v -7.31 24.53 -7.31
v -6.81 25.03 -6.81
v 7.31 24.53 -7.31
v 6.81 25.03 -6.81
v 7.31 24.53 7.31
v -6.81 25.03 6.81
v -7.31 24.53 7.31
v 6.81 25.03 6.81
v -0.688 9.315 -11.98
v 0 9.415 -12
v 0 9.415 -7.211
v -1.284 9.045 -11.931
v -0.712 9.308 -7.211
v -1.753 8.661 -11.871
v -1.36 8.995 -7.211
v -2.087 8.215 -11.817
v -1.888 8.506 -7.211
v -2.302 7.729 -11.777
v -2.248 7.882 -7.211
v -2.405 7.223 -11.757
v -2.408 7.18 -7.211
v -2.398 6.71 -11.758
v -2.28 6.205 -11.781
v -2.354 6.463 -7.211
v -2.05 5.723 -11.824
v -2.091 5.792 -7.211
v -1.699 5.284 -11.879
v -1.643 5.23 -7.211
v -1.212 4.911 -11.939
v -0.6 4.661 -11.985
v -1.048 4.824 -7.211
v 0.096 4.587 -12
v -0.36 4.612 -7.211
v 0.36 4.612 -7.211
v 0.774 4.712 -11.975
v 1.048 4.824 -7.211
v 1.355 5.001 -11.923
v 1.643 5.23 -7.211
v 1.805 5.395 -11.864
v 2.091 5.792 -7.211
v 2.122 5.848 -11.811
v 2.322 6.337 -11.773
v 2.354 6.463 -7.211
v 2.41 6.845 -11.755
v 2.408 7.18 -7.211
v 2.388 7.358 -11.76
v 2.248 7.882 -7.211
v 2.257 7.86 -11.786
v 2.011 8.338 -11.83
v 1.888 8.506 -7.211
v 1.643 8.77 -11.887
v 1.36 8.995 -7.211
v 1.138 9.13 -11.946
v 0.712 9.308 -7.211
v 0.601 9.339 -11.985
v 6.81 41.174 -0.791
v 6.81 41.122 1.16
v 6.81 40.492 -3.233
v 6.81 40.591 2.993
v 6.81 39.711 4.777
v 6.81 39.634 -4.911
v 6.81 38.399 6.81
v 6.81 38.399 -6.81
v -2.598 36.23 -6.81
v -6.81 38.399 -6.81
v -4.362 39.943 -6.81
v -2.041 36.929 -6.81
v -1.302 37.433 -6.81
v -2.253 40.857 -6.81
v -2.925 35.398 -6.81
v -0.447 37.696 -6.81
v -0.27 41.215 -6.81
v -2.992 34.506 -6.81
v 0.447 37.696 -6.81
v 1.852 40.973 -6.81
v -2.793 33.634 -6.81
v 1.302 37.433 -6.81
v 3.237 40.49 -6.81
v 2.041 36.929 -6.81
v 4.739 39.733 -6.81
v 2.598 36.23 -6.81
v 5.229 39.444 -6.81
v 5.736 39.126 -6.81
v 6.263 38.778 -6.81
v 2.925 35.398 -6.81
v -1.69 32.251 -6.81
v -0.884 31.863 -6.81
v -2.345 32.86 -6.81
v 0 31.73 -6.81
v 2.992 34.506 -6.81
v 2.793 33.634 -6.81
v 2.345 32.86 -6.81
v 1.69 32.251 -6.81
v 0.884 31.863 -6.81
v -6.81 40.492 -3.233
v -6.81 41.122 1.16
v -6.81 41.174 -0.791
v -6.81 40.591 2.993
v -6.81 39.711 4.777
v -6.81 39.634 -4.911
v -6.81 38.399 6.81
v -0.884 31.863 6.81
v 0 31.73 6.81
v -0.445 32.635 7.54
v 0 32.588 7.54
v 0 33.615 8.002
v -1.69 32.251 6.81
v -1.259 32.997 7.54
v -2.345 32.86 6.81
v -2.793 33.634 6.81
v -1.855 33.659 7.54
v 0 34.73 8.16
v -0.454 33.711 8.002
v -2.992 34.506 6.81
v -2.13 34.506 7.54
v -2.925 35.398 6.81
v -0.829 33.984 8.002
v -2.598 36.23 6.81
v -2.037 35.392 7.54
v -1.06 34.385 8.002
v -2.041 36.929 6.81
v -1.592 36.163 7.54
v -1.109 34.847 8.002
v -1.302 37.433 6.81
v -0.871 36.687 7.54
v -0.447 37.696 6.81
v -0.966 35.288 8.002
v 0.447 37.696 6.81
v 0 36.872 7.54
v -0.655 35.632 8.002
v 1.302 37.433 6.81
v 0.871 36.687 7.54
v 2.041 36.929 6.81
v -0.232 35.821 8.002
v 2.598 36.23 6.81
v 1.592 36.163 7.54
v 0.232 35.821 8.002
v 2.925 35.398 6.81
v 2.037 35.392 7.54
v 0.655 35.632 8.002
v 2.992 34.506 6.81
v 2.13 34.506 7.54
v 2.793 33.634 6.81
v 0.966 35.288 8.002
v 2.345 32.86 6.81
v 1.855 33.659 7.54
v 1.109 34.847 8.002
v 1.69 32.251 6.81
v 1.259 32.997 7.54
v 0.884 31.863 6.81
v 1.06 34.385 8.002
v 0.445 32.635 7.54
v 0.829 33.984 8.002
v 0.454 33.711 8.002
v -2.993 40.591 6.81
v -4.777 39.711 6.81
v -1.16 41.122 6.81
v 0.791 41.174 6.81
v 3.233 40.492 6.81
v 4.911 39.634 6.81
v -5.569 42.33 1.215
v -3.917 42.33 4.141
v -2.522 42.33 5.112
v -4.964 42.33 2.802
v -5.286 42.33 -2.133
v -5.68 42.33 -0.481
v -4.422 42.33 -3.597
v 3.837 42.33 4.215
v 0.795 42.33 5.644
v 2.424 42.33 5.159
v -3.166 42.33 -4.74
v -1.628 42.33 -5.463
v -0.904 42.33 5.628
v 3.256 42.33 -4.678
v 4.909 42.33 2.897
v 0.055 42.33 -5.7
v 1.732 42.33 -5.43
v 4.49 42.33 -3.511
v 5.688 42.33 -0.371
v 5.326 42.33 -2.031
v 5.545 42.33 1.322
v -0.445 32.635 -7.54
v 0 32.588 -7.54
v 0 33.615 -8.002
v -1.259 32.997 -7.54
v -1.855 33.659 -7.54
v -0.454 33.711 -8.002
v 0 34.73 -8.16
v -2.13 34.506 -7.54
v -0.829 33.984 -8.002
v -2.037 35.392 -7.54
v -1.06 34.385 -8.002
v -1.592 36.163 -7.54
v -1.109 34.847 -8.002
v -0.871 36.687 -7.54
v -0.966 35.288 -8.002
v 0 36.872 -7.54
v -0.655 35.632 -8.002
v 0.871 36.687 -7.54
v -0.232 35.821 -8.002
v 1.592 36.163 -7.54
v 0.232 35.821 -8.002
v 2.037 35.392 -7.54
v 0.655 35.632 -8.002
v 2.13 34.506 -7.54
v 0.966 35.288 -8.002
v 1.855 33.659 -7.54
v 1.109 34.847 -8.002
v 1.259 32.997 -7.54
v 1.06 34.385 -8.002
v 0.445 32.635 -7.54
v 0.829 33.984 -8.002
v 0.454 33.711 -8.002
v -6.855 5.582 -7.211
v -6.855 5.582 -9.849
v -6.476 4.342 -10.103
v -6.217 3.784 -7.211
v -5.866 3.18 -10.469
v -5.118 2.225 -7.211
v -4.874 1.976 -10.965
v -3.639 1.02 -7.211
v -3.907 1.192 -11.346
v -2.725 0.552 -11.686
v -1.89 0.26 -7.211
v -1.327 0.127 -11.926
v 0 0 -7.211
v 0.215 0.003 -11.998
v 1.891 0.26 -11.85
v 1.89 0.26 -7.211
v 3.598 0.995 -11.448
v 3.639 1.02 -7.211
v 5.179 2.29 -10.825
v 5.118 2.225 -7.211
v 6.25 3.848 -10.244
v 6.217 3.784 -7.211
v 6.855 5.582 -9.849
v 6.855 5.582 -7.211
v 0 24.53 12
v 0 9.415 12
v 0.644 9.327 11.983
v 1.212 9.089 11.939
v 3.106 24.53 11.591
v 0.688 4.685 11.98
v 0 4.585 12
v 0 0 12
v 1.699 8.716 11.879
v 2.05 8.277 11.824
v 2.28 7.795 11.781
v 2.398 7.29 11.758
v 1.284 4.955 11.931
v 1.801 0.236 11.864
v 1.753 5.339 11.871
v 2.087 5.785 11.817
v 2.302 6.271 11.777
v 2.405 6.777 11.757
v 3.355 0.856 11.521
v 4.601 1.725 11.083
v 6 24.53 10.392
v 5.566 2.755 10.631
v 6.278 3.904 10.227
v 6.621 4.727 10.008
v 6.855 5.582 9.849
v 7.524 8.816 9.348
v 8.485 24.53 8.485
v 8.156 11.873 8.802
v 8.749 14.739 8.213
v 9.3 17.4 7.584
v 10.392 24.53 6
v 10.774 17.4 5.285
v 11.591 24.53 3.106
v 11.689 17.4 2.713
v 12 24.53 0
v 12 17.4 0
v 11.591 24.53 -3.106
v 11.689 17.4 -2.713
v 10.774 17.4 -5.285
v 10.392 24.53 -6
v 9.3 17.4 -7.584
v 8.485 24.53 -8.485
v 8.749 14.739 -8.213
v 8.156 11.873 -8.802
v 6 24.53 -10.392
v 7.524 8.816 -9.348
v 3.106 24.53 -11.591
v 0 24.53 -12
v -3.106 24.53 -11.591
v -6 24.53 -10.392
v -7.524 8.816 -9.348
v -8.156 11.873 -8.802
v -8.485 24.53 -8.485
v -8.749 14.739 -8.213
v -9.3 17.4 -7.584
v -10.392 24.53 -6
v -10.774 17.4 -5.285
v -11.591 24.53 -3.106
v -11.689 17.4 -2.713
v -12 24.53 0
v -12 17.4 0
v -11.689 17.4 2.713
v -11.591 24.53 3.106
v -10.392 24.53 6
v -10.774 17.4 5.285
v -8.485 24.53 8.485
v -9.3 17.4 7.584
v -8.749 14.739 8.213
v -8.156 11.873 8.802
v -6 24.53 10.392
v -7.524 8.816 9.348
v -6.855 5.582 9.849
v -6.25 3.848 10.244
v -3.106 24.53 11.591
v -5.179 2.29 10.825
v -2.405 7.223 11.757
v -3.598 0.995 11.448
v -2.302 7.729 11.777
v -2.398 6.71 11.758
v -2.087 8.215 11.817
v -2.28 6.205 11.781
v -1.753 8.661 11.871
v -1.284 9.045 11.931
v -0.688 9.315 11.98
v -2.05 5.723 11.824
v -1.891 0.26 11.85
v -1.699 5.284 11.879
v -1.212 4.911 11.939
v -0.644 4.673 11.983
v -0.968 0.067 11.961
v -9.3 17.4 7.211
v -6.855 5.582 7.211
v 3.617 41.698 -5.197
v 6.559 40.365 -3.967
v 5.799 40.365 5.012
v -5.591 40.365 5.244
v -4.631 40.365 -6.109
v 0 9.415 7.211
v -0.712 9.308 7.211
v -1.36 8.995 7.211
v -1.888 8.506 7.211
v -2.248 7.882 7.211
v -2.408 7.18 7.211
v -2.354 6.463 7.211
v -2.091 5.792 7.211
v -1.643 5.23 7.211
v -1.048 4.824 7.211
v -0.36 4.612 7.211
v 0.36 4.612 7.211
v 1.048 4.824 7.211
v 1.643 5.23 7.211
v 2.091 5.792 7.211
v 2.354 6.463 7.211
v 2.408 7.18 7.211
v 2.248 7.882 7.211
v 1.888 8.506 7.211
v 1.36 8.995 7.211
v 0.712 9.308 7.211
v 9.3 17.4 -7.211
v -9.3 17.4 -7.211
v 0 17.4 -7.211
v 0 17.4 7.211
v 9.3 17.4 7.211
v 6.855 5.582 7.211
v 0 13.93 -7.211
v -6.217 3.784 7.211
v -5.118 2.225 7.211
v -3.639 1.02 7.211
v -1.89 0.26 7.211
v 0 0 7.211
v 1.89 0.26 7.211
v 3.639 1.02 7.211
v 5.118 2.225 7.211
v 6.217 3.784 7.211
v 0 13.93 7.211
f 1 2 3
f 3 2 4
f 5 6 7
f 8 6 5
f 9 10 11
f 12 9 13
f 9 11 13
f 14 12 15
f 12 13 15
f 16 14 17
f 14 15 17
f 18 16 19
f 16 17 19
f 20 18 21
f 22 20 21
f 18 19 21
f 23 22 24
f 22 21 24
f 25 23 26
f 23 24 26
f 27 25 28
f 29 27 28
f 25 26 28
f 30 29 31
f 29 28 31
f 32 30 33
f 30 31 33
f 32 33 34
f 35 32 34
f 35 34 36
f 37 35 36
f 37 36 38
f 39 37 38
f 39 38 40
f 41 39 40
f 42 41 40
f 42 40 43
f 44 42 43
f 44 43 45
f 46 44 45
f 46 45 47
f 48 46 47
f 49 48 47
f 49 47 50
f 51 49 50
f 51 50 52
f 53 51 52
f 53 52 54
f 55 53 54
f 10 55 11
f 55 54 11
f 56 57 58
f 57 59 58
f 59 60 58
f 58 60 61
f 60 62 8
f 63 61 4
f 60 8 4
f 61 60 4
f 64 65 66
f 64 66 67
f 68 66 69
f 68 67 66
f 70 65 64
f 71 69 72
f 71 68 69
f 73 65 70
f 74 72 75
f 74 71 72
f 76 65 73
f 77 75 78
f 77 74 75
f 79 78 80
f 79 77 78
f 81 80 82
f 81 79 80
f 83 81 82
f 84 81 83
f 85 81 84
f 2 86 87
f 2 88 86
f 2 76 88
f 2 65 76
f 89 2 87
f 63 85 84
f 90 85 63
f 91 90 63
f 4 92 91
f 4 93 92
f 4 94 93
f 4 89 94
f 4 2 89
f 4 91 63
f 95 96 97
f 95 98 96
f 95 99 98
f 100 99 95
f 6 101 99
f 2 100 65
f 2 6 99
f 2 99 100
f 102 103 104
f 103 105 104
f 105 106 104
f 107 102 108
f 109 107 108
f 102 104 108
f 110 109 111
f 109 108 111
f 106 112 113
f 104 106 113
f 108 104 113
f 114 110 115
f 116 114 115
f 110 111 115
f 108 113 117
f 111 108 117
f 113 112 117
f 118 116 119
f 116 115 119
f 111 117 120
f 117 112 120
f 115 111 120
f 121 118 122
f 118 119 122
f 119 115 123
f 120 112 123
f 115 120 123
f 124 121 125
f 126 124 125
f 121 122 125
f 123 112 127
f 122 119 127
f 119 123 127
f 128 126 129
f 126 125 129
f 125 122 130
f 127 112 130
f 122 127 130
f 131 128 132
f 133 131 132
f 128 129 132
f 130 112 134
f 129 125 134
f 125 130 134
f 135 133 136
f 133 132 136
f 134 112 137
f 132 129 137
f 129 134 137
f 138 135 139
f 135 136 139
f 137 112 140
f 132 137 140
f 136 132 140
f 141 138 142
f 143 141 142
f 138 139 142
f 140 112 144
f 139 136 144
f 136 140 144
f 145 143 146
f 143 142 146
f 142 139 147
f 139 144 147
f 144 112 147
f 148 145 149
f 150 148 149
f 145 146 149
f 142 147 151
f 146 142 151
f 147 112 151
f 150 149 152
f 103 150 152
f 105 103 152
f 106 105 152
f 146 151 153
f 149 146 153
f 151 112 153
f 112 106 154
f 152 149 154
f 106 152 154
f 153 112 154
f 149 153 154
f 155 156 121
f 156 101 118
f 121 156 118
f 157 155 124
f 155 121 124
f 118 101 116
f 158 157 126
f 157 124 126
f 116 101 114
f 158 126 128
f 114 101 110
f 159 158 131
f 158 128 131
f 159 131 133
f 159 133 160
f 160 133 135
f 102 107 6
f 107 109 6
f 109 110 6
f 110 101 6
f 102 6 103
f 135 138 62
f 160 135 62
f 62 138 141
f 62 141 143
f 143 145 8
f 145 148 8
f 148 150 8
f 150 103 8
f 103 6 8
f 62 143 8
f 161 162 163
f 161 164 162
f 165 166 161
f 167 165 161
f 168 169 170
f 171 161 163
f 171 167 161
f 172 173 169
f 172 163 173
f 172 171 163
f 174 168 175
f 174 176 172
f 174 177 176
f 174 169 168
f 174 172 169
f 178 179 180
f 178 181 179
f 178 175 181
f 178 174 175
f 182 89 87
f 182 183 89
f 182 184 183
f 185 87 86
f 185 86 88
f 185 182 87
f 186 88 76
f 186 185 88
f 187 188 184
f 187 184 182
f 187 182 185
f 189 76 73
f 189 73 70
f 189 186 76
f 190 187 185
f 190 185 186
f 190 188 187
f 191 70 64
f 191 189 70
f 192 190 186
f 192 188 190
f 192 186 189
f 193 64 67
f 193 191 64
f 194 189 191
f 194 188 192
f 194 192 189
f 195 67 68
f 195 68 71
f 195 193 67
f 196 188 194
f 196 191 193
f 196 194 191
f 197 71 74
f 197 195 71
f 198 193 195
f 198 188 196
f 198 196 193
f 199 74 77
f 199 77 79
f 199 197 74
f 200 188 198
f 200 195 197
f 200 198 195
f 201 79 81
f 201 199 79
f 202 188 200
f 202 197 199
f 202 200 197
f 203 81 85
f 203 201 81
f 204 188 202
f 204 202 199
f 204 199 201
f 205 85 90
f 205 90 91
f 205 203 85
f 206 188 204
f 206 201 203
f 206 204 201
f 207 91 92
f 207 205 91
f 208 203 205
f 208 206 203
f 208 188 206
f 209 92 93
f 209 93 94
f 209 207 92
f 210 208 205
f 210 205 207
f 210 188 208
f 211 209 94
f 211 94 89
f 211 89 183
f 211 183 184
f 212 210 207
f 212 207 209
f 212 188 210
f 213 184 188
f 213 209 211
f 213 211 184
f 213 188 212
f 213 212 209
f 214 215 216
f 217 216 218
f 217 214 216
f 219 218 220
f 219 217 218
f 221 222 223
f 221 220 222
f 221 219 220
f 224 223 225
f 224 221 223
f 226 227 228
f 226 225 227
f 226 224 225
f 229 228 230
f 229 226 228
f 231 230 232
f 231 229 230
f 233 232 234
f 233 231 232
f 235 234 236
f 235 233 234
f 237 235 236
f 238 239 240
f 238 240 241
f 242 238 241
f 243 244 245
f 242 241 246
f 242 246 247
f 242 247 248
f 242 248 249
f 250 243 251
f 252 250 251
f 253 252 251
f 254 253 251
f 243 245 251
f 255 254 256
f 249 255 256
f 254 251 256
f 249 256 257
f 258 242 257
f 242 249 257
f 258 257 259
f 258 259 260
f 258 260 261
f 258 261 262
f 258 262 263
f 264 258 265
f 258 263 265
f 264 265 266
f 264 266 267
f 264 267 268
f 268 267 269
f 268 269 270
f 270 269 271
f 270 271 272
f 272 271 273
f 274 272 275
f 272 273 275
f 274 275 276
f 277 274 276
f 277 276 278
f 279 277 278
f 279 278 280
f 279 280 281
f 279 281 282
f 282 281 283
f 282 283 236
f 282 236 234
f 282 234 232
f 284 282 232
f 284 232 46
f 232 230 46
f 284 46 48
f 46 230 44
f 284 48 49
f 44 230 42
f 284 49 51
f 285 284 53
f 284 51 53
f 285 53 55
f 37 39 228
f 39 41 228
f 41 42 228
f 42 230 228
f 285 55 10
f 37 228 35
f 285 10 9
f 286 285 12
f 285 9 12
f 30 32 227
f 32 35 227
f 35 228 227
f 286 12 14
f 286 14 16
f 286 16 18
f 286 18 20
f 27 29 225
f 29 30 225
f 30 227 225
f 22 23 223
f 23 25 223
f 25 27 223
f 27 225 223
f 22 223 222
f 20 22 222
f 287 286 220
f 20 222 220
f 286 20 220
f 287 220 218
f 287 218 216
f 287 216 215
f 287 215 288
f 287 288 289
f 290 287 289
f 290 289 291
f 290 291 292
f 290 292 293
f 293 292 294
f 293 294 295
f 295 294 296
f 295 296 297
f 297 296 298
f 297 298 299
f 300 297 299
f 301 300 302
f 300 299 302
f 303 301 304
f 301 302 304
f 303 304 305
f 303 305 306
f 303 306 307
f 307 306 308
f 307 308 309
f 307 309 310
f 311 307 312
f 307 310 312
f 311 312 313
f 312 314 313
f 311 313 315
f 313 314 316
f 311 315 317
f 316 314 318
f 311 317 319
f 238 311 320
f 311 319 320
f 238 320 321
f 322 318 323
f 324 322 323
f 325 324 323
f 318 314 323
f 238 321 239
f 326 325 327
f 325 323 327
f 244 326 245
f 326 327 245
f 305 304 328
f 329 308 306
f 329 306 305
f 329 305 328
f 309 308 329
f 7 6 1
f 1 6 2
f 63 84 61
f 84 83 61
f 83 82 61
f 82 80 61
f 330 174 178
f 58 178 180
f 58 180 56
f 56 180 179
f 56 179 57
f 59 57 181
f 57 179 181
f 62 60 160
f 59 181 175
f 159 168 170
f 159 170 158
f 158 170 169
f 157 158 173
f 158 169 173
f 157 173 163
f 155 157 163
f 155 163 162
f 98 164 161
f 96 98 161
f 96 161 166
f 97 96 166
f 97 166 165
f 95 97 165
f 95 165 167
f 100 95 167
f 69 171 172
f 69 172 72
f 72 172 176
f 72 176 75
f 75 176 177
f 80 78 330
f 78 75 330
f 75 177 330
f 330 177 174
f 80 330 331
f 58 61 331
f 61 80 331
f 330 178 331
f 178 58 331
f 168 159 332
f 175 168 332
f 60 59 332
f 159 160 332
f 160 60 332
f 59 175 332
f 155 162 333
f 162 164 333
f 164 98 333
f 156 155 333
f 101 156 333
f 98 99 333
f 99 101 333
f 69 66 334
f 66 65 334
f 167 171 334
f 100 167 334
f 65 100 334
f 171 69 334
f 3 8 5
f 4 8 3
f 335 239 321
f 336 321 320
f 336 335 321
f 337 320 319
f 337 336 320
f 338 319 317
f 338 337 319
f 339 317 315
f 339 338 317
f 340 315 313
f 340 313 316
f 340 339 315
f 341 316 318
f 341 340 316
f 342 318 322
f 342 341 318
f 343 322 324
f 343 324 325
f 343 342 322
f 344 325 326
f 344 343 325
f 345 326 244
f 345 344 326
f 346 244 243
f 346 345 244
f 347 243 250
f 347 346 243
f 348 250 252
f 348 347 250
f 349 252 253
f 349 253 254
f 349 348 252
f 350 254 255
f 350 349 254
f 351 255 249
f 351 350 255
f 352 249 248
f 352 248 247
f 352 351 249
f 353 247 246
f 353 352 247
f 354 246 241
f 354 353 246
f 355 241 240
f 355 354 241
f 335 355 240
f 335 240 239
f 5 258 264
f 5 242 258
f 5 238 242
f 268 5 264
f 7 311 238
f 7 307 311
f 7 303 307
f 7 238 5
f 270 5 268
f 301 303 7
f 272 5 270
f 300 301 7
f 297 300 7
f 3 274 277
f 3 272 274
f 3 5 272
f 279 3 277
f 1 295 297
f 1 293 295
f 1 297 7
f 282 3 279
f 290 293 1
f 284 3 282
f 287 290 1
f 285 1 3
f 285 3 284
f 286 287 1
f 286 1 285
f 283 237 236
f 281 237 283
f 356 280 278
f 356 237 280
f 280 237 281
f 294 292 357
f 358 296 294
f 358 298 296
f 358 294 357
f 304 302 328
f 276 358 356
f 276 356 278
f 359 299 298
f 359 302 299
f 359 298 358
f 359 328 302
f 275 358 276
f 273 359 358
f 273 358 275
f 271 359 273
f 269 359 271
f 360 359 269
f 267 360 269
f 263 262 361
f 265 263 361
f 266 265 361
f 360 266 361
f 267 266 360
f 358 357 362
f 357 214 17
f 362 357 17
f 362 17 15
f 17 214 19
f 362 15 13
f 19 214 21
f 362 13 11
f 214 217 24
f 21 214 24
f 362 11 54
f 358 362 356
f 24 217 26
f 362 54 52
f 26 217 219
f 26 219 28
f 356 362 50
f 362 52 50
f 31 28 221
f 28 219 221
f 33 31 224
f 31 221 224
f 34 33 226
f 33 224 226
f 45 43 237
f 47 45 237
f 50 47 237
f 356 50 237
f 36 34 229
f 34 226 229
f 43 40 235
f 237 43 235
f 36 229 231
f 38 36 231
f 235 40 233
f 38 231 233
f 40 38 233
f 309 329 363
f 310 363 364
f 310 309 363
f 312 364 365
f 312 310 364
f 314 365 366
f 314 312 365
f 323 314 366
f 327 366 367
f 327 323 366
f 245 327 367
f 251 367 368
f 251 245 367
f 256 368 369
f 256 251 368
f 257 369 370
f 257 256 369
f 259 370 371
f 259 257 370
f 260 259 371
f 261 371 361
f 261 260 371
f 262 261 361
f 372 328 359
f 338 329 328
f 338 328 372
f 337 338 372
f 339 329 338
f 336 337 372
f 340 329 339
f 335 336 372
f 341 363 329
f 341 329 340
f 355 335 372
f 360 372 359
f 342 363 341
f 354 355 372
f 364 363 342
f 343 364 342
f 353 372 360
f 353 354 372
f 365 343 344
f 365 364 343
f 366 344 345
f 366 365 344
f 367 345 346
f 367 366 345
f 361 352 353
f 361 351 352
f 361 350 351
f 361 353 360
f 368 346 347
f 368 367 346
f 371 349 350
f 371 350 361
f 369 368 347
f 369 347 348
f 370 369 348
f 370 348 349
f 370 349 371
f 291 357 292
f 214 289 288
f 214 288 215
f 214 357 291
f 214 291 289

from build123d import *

# Parameters (mm, degrees)
SKETCH1_R           = 12
BOSS_EXTRUDE1_DEPTH = 33.53
CUT_EXTRUDE1_DEPTH  = 19.6
CHAMFER1_SIZE       = 0.4
SKETCH3_R           = 9.375
CUT_EXTRUDE2_DEPTH  = 3.4
CUT_EXTRUDE2_DRAFT  = -35
SKETCH4_W           = 24
SKETCH4_H           = 14.42225279
CUT_EXTRUDE3_DEPTH  = 17.4
SKETCH5_R           = 2.415
CUT_EXTRUDE4_DEPTH  = 33.7
CUT_EXTRUDE5_START  = -9
SKETCH6_R           = 12
CUT_EXTRUDE5_DEPTH  = 9
BOSS_EXTRUDE2_START = -7.13
SKETCH7_R           = 12
BOSS_EXTRUDE2_DEPTH = 7.13
SKETCH8_W           = 13.62
SKETCH8_H           = 13.62
BOSS_EXTRUDE3_DEPTH = 17.8
CHAMFER2_SIZE       = 0.5


with BuildPart() as part:
    # Sketch1 → Boss-Extrude1 (new body)
    with BuildSketch(Plane(origin=(0, 0, 0), x_dir=(1, 0, 0), z_dir=(0, 1, 0))):
        with Locations(Location((0, 0, 0), (0, 0, 270))):
            Circle(SKETCH1_R)
    extrude(amount=BOSS_EXTRUDE1_DEPTH)

    # Sketch2 → Cut-Extrude1 (cut)
    with BuildSketch(Plane(origin=(0, 33.53, 0), x_dir=(1, 0, 0), z_dir=(0, 1, 0))):
        with BuildLine():
            Line((-6.5, 6.5), (-2.5, 6.5))
            ThreePointArc((-2.5, 6.5), (0, 7.211126395), (2.5, 6.5))
            Line((2.5, 6.5), (6.5, 6.5))
            Line((6.5, 6.5), (6.5, 2.5))
            ThreePointArc((6.5, 2.5), (7.211126395, 0), (6.5, -2.5))
            Line((6.5, -2.5), (6.5, -6.5))
            Line((6.5, -6.5), (2.5, -6.5))
            ThreePointArc((2.5, -6.5), (0, -7.211126395), (-2.5, -6.5))
            Line((-2.5, -6.5), (-6.5, -6.5))
            Line((-6.5, -6.5), (-6.5, -2.5))
            ThreePointArc((-6.5, -2.5), (-7.211126395, 0), (-6.5, 2.5))
            Line((-6.5, 2.5), (-6.5, 6.5))
        make_face()
    extrude(amount=-CUT_EXTRUDE1_DEPTH, mode=Mode.SUBTRACT)

    # Chamfer1
    chamfer1_edges = [part.edges().sort_by_distance(p)[0] for p in [
        (-6.5, 23.73, -6.5),
        (6.5, 23.73, -6.5),
        (6.5, 23.73, 6.5),
        (-6.5, 23.73, 6.5),
    ]]
    chamfer(chamfer1_edges, length=CHAMFER1_SIZE)


with BuildPart() as cut_extrude2_tool:
    # Sketch3 → Cut-Extrude2 (with draft: the straight prism first)
    with BuildSketch(Plane(origin=(0, 33.53, 0), x_dir=(1, 0, 0), z_dir=(0, 1, 0))):
        Circle(SKETCH3_R)
    extrude(amount=-CUT_EXTRUDE2_DEPTH)
    # Cut-Extrude2: the draft: its side faces are tilted about the plane it starts from
    cut_extrude2_sides = [cut_extrude2_tool.faces().sort_by_distance(p)[0] for p in [
        (-9.375, 31.83, 0),
    ]]
    draft(cut_extrude2_sides, Plane(origin=(0, 33.53, 0), x_dir=(1, 0, 0), z_dir=(0, 1, 0)), CUT_EXTRUDE2_DRAFT)


with BuildPart() as part_1:
    add(part.part)

    # Cut-Extrude2: cut by cut_extrude2_tool
    add(cut_extrude2_tool.part, mode=Mode.SUBTRACT)

    # Sketch4 → Cut-Extrude3 (cut)
    with BuildSketch(Plane.XZ):
        Rectangle(SKETCH4_W, SKETCH4_H)
    extrude(amount=-CUT_EXTRUDE3_DEPTH, mode=Mode.SUBTRACT)

    # Sketch5 → Cut-Extrude4 (cut, symmetric)
    with BuildSketch(Plane.XY):
        with Locations(Location((0, 7, 0), (0, 0, 90))):
            Circle(SKETCH5_R)
        with BuildLine():
            ThreePointArc((-6.854820161, 5.581747356), (0, 0), (6.854820161, 5.581747356))
            Line((6.854820161, 5.581747356), (9.3, 17.4))
            Line((9.3, 17.4), (12, 17.4))
            Line((12, 17.4), (12, -3.192277431))
            Line((12, -3.192277431), (-12, -3.192277431))
            Line((-12, -3.192277431), (-12, 17.4))
            Line((-12, 17.4), (-9.3, 17.4))
            Line((-9.3, 17.4), (-6.854820161, 5.581747356))
        make_face()
    extrude(amount=CUT_EXTRUDE4_DEPTH, both=True, mode=Mode.SUBTRACT)

    # Sketch6 → Cut-Extrude5 (cut)
    with BuildSketch(Plane(origin=(0, 33.53, 0), x_dir=(1, 0, 0), z_dir=(0, 1, 0)).offset(CUT_EXTRUDE5_START)):
        with Locations(Location((0, 0, 0), (0, 0, 55.16360803))):
            Circle(SKETCH6_R)
    extrude(amount=CUT_EXTRUDE5_DEPTH, mode=Mode.SUBTRACT)

    # Sketch7 → Boss-Extrude2 (add)
    with BuildSketch(Plane(origin=(0, 24.53, 0), x_dir=(1, 0, 0), z_dir=(0, 1, 0)).offset(BOSS_EXTRUDE2_START)):
        with Locations(Location((0, 0, 0), (0, 0, 55.16360803))):
            Circle(SKETCH7_R)
    extrude(amount=BOSS_EXTRUDE2_DEPTH)

    # Sketch8 → Boss-Extrude3 (add)
    with BuildSketch(Plane(origin=(0, 24.53, 0), x_dir=(1, 0, 0), z_dir=(0, 1, 0))):
        Rectangle(SKETCH8_W, SKETCH8_H)
    extrude(amount=BOSS_EXTRUDE3_DEPTH)

    # Sketch9 → Cut-Revolve1 (revolve, cut)
    with BuildSketch(Plane.XY, mode=Mode.PRIVATE) as cut_revolve1_sk:
        Polygon((5.7, 42.33), (13.111265215, 42.33), (13.111265215, 34.918734785), align=None)
    revolve(cut_revolve1_sk.sketch.rotate(Axis((0, 44.4465, 0), (0, -1, 0)), 304.83639197), axis=Axis((0, 44.4465, 0), (0, -1, 0)), mode=Mode.SUBTRACT)

    # Chamfer2
    chamfer2_edges = [part_1.edges().sort_by_distance(p)[0] for p in [
        (6.81, 24.53, 0),
        (0, 24.53, -6.81),
        (-6.81, 24.53, 0),
        (0, 24.53, 6.81),
    ]]
    chamfer(chamfer2_edges, length=CHAMFER2_SIZE)

    # Sketch10 → Revolve1 (revolve)
    with BuildSketch(Plane(origin=(0, 0, 0), x_dir=(0, 0, -1), z_dir=(1, 0, 0))):
        with BuildLine():
            Line((6.81, 34.73), (6.81, 31.73))
            ThreePointArc((6.81, 31.73), (7.806952033, 33.085121585), (8.16, 34.73))
            Line((8.16, 34.73), (6.81, 34.73))
        make_face()
    revolve1 = revolve(axis=Axis((0, 34.73, -6.81), (0, 0, -1)))

    # Mirror1: Revolve1 across plane
    add(revolve1.mirror(Plane.XY))


solid = part_1.part
